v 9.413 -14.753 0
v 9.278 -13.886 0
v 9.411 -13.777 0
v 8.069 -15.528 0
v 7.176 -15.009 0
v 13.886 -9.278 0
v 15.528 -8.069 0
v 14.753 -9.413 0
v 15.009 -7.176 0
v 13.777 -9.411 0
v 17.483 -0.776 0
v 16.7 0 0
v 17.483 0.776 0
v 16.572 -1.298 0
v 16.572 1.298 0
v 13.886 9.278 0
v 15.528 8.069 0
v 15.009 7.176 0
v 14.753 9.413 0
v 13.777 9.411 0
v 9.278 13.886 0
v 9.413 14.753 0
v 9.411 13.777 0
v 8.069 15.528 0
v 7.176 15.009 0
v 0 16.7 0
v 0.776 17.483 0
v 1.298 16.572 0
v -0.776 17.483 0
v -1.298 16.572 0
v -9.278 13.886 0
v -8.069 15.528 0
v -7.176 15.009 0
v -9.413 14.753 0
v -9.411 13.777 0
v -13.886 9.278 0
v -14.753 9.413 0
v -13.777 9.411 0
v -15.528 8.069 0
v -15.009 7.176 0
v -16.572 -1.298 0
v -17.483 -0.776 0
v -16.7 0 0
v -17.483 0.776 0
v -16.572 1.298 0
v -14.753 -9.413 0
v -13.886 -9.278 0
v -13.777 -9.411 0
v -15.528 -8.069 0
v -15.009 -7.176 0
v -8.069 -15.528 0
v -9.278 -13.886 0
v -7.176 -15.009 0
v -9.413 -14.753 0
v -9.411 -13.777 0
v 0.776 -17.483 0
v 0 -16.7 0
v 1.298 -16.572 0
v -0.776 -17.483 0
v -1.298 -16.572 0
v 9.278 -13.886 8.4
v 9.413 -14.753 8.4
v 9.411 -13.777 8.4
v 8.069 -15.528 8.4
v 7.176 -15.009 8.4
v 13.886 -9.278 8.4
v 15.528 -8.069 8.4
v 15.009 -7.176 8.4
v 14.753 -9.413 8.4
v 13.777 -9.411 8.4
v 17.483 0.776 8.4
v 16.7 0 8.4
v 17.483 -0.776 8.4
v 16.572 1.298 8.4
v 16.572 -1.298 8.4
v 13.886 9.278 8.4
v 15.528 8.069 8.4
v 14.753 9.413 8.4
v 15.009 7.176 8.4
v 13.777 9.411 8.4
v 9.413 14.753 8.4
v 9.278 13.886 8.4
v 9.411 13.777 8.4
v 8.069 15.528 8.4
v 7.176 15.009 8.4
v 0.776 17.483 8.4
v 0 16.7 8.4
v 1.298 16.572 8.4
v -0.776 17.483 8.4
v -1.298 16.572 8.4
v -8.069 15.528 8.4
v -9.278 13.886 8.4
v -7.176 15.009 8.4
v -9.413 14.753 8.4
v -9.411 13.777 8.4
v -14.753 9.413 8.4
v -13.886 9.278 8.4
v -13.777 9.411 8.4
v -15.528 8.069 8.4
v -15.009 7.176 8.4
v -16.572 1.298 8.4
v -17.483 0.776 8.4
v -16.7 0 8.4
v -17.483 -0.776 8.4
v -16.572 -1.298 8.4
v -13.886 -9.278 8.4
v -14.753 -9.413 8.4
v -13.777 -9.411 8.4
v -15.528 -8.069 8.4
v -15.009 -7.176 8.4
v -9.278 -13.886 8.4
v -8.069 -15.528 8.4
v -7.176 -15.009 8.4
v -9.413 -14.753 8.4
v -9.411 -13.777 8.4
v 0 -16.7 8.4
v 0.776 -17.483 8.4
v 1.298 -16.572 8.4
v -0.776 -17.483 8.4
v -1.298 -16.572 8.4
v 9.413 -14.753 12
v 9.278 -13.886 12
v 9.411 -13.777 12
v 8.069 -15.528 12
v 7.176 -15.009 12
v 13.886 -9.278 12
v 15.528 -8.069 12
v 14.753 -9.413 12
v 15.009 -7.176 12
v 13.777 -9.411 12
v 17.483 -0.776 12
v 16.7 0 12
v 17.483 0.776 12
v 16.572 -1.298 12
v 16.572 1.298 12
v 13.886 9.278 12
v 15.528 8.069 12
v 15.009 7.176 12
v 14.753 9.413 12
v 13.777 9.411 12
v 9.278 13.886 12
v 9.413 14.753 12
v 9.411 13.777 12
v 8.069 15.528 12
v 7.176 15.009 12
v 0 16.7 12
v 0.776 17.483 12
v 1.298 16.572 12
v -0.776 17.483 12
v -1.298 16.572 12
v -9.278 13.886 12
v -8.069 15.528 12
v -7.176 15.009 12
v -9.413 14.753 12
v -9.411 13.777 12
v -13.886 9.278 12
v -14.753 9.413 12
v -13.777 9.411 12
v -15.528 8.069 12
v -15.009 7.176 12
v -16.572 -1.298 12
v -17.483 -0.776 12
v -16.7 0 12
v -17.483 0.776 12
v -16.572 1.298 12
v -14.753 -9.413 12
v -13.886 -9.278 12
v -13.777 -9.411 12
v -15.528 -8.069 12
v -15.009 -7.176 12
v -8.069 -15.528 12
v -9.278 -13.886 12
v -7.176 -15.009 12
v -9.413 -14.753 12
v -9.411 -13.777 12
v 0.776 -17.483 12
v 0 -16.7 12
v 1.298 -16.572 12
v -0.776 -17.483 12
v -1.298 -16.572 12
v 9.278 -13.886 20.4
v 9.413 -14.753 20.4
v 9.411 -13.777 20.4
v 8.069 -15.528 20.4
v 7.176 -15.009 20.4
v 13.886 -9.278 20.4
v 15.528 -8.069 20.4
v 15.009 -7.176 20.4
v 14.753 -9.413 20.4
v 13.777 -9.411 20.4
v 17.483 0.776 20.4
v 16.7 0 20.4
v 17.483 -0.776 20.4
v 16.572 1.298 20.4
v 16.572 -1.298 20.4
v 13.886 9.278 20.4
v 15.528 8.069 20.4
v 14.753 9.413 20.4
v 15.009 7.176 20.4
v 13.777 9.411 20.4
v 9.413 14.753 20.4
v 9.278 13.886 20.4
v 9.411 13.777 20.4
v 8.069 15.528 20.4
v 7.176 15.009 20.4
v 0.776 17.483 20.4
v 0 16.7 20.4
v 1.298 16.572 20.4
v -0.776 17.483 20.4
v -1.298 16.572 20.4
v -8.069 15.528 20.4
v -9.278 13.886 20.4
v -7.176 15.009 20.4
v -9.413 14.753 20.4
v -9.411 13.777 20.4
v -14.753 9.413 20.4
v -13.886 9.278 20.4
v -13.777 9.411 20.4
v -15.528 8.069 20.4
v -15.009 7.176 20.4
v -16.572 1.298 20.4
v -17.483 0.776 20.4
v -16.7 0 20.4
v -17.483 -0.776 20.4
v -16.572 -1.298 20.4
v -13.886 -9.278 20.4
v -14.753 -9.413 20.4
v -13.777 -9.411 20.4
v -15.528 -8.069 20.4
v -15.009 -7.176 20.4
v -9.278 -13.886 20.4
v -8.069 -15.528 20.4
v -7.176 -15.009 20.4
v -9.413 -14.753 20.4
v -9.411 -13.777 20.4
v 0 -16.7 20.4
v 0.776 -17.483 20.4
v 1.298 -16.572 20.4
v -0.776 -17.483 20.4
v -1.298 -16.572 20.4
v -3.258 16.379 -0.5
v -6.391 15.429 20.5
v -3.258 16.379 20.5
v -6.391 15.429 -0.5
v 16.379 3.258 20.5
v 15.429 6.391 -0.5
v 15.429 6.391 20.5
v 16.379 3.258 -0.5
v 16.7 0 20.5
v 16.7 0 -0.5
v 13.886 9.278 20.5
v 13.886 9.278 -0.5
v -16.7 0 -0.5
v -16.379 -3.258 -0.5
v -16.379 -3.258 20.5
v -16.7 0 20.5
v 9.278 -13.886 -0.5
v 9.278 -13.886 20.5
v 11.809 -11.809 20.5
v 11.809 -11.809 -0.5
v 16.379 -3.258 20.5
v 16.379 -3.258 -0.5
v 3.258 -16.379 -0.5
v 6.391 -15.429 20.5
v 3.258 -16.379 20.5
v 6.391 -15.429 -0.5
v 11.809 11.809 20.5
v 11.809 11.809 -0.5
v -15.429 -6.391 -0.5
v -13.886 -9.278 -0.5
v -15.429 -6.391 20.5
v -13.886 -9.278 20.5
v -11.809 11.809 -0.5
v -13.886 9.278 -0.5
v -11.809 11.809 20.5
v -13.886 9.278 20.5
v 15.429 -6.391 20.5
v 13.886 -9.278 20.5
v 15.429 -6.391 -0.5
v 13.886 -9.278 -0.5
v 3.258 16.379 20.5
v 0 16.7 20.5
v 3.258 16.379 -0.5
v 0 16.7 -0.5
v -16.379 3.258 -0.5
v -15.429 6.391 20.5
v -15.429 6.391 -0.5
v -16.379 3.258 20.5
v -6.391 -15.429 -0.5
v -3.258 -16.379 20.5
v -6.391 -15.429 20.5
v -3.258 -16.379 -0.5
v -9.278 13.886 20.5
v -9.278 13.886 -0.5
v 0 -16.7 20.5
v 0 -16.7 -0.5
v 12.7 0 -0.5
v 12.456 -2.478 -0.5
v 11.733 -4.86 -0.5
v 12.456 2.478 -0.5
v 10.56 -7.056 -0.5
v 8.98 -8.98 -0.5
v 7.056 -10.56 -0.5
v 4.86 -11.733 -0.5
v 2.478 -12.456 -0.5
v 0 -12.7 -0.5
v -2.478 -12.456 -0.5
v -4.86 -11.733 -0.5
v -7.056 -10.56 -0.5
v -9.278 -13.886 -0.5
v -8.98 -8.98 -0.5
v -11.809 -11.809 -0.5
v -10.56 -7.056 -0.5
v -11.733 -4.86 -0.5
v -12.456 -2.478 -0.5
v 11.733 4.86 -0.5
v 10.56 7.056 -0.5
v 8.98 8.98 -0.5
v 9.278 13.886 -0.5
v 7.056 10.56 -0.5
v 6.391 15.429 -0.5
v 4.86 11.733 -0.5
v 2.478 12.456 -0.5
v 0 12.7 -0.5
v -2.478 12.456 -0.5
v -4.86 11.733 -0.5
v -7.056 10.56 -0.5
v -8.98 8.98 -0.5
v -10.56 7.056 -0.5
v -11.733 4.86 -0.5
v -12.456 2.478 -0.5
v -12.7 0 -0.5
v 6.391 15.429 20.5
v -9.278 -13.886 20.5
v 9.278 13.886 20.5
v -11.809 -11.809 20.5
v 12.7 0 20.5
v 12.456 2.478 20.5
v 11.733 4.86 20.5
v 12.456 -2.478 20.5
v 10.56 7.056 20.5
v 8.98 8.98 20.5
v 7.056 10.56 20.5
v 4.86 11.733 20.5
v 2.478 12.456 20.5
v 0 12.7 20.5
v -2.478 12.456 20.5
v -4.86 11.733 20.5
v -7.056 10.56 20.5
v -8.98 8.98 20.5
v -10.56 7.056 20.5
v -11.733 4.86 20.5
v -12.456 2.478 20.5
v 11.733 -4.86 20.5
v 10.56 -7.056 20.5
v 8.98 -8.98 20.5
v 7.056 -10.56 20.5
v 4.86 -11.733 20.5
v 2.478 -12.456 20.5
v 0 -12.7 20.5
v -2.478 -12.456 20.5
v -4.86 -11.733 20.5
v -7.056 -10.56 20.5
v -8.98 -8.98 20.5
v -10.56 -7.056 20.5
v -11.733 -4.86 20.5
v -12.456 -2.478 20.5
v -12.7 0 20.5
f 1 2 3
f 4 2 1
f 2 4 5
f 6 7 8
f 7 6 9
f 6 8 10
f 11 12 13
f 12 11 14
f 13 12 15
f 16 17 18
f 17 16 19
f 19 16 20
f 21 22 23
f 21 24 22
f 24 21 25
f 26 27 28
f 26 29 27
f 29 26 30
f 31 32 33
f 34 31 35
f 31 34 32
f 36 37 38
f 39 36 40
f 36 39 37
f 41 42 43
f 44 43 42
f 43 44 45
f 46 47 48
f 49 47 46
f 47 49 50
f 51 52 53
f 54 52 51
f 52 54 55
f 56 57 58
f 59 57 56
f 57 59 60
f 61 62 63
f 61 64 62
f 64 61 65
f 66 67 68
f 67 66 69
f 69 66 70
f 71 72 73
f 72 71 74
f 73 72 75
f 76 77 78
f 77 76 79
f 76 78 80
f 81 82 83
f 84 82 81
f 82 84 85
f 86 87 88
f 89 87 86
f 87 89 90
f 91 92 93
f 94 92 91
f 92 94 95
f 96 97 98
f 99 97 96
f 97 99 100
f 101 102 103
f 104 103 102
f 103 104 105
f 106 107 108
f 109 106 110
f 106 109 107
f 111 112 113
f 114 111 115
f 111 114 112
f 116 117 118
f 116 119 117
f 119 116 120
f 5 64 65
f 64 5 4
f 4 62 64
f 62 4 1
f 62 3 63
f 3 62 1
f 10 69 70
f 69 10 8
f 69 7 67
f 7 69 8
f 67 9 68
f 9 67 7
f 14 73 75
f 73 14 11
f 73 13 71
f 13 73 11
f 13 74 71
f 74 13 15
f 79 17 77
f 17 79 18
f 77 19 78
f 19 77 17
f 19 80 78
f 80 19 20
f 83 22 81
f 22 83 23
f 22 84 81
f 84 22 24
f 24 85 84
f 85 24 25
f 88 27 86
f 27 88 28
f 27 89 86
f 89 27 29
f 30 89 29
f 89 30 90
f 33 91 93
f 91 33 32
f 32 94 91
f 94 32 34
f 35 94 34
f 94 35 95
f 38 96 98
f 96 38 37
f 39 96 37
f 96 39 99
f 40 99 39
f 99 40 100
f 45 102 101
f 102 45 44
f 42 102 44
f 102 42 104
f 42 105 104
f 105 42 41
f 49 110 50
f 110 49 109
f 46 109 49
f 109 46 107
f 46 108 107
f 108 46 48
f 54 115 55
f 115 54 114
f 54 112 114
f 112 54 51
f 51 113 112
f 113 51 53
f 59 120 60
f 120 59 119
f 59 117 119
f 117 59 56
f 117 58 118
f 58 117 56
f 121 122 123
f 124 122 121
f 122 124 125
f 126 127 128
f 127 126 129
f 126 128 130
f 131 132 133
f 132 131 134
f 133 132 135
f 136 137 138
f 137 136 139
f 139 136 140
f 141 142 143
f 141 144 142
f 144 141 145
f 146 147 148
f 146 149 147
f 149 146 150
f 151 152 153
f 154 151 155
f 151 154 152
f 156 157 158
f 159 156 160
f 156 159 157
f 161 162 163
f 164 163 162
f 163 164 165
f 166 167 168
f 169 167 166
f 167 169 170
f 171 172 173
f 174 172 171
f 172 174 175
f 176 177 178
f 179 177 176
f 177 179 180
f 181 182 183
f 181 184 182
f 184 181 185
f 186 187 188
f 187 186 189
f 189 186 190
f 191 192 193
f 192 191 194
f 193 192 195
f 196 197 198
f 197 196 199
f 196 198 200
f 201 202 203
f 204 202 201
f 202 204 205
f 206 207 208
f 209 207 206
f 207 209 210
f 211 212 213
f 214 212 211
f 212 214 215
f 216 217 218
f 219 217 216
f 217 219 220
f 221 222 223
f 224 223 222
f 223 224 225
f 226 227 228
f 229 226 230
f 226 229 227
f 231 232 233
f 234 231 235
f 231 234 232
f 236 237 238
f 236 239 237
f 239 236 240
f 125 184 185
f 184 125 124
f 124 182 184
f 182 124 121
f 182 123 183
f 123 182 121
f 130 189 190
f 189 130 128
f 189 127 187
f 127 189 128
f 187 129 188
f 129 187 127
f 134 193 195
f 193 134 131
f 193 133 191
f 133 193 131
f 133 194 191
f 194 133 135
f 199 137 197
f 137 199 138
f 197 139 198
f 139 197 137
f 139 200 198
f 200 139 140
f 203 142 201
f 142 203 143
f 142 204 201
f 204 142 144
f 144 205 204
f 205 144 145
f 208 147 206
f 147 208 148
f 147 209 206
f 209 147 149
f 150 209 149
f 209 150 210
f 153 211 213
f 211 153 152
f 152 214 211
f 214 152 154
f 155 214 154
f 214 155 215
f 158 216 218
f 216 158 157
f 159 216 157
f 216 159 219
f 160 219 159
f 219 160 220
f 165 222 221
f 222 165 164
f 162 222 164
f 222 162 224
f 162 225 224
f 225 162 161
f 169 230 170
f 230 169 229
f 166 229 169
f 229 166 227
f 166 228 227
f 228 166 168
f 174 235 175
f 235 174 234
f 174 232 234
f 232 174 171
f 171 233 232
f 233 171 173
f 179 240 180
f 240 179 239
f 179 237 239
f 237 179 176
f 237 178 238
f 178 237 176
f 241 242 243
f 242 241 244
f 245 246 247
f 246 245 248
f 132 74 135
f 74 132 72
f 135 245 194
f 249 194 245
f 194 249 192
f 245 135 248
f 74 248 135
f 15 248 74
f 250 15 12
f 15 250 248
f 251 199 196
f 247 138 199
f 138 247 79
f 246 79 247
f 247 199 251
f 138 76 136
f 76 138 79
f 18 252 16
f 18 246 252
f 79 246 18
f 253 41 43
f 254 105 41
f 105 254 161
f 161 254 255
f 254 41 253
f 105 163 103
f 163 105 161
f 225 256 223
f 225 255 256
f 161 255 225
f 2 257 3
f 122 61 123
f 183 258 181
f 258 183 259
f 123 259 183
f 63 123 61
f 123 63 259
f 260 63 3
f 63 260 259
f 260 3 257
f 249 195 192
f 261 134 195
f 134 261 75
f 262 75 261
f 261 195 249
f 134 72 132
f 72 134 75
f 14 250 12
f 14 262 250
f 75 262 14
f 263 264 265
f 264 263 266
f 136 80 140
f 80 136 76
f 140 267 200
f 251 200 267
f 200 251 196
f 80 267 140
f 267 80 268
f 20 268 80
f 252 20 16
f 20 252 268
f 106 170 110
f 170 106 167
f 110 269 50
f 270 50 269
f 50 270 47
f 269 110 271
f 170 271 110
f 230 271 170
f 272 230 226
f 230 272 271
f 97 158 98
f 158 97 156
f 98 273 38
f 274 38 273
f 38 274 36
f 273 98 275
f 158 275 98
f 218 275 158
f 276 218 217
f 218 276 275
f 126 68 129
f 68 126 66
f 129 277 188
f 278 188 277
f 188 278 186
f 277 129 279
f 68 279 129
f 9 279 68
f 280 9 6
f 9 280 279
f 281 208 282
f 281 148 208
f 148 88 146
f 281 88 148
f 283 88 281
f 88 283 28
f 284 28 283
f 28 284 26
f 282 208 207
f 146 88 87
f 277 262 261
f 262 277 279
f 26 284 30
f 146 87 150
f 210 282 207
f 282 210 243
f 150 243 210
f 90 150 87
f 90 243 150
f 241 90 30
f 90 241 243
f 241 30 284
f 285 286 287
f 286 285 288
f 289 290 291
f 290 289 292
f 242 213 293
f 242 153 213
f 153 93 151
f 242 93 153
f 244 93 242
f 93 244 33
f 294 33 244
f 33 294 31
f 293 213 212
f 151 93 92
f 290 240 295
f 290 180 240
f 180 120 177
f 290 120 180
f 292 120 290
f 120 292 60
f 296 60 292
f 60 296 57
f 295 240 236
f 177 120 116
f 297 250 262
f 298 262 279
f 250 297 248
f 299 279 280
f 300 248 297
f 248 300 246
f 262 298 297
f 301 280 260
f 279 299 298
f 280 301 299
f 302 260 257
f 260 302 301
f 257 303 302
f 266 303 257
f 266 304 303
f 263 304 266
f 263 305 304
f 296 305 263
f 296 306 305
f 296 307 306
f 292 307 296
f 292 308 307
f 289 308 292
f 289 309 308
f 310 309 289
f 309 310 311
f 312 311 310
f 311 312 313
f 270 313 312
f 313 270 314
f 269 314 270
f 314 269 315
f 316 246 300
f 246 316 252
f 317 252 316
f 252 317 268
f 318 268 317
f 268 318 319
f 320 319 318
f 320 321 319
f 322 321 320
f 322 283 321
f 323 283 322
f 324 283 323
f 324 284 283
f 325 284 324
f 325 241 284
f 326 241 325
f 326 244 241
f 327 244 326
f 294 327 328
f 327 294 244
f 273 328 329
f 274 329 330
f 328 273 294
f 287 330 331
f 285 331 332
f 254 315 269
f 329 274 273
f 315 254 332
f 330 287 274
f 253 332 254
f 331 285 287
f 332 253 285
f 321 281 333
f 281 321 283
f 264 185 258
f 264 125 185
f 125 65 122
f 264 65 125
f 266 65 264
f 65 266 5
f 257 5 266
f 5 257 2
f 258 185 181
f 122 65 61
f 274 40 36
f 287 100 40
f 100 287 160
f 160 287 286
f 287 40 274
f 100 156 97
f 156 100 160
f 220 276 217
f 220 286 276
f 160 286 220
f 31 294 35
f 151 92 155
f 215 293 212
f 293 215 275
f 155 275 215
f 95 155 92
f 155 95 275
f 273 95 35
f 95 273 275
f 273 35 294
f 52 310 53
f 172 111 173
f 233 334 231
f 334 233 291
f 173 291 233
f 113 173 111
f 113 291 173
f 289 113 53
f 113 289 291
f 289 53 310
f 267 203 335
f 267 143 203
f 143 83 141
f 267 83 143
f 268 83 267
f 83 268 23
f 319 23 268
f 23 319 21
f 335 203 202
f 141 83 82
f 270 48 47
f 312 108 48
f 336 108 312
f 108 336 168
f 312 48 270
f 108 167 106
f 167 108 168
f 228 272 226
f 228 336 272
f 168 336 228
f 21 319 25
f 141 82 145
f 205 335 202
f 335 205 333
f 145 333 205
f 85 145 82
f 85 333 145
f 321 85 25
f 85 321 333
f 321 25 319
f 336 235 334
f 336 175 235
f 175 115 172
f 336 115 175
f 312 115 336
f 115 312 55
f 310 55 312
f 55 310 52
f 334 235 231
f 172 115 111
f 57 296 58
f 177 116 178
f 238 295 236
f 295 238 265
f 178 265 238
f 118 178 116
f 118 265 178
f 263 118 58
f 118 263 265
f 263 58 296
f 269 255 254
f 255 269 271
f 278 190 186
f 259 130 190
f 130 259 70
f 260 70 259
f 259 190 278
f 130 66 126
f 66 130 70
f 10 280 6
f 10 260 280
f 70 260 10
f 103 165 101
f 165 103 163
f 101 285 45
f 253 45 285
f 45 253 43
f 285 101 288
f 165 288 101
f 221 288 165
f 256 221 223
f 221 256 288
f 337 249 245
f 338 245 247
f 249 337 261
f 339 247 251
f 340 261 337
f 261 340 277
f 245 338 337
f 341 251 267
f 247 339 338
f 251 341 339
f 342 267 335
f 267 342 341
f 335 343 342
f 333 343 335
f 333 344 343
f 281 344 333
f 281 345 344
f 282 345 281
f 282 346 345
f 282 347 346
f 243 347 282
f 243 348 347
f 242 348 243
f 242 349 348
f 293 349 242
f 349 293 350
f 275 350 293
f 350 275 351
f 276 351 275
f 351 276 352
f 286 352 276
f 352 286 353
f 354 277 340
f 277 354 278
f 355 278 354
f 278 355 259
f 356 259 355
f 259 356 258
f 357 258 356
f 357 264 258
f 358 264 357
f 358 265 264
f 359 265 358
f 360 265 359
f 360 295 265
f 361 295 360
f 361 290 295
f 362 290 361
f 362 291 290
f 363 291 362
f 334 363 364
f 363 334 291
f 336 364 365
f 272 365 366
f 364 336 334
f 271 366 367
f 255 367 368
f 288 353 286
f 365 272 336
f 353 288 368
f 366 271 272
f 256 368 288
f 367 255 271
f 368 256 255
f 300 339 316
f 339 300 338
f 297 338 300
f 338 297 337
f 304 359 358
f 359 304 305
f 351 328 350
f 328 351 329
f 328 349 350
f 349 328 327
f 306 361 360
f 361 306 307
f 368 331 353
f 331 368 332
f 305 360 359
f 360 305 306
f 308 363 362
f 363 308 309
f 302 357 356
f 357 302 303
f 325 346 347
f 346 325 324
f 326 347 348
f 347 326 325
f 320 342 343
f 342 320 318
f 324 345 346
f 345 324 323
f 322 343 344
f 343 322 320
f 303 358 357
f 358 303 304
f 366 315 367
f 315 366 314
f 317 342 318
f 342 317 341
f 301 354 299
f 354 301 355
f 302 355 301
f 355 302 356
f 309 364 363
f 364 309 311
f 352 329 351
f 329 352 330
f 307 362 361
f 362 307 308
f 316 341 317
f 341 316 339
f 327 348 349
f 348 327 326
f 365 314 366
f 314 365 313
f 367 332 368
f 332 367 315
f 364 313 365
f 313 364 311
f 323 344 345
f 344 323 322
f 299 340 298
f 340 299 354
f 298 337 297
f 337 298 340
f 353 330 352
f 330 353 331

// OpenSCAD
$fn = 32;

// ----------------------------------------------------------------------
// Two-module gear rim: z12 m2.5 and z12 m2.5, 20 mm wide
// ----------------------------------------------------------------------

// --- parameters (mm) ---
module_a = 2.5;           // first tooth module
teeth_a = 12;             // first band tooth count
module_b = 2.5;           // second tooth module
teeth_b = 12;             // second band tooth count
band_h = 8;               // height of one tooth band
web_t = 4;                // web thickness between the bands
total = 20;               // overall width over both bands
root_r = 11.88;           // root radius of the coarse band
hub_r = 16.7;             // hub radius
bore_d = 25.4;            // hub bore
hole_count = 4;           // lightening holes
hole_r = 9.69;            // lightening hole circle radius
hole_d = 4;               // lightening hole diameter

band_a = [[11.749, -1.723], [15.146, -1.889], [16.318, -1.444], [17.483, -0.776], [17.483, 0.776], [16.318, 1.444], [15.146, 1.889], [11.749, 1.723], [11.037, 4.383], [14.062, 5.937], [14.854, 6.908], [15.528, 8.069], [14.753, 9.413], [13.41, 9.41], [12.172, 9.209], [9.314, 7.367], [7.367, 9.314], [9.209, 12.172], [9.41, 13.41], [9.413, 14.753], [8.069, 15.528], [6.908, 14.854], [5.937, 14.062], [4.383, 11.037], [1.723, 11.749], [1.889, 15.146], [1.444, 16.318], [0.776, 17.483], [-0.776, 17.483], [-1.444, 16.318], [-1.889, 15.146], [-1.723, 11.749], [-4.383, 11.037], [-5.937, 14.062], [-6.908, 14.854], [-8.069, 15.528], [-9.413, 14.753], [-9.41, 13.41], [-9.209, 12.172], [-7.367, 9.314], [-9.314, 7.367], [-12.172, 9.209], [-13.41, 9.41], [-14.753, 9.413], [-15.528, 8.069], [-14.854, 6.908], [-14.062, 5.937], [-11.037, 4.383], [-11.749, 1.723], [-15.146, 1.889], [-16.318, 1.444], [-17.483, 0.776], [-17.483, -0.776], [-16.318, -1.444], [-15.146, -1.889], [-11.749, -1.723], [-11.037, -4.383], [-14.062, -5.937], [-14.854, -6.908], [-15.528, -8.069], [-14.753, -9.413], [-13.41, -9.41], [-12.172, -9.209], [-9.314, -7.367], [-7.367, -9.314], [-9.209, -12.172], [-9.41, -13.41], [-9.413, -14.753], [-8.069, -15.528], [-6.908, -14.854], [-5.937, -14.062], [-4.383, -11.037], [-1.723, -11.749], [-1.889, -15.146], [-1.444, -16.318], [-0.776, -17.483], [0.776, -17.483], [1.444, -16.318], [1.889, -15.146], [1.723, -11.749], [4.383, -11.037], [5.937, -14.062], [6.908, -14.854], [8.069, -15.528], [9.413, -14.753], [9.41, -13.41], [9.209, -12.172], [7.367, -9.314], [9.314, -7.367], [12.172, -9.209], [13.41, -9.41], [14.753, -9.413], [15.528, -8.069], [14.854, -6.908], [14.062, -5.937], [11.037, -4.383]];
band_b = [[11.749, -1.723], [15.146, -1.889], [16.318, -1.444], [17.483, -0.776], [17.483, 0.776], [16.318, 1.444], [15.146, 1.889], [11.749, 1.723], [11.037, 4.383], [14.062, 5.937], [14.854, 6.908], [15.528, 8.069], [14.753, 9.413], [13.41, 9.41], [12.172, 9.209], [9.314, 7.367], [7.367, 9.314], [9.209, 12.172], [9.41, 13.41], [9.413, 14.753], [8.069, 15.528], [6.908, 14.854], [5.937, 14.062], [4.383, 11.037], [1.723, 11.749], [1.889, 15.146], [1.444, 16.318], [0.776, 17.483], [-0.776, 17.483], [-1.444, 16.318], [-1.889, 15.146], [-1.723, 11.749], [-4.383, 11.037], [-5.937, 14.062], [-6.908, 14.854], [-8.069, 15.528], [-9.413, 14.753], [-9.41, 13.41], [-9.209, 12.172], [-7.367, 9.314], [-9.314, 7.367], [-12.172, 9.209], [-13.41, 9.41], [-14.753, 9.413], [-15.528, 8.069], [-14.854, 6.908], [-14.062, 5.937], [-11.037, 4.383], [-11.749, 1.723], [-15.146, 1.889], [-16.318, 1.444], [-17.483, 0.776], [-17.483, -0.776], [-16.318, -1.444], [-15.146, -1.889], [-11.749, -1.723], [-11.037, -4.383], [-14.062, -5.937], [-14.854, -6.908], [-15.528, -8.069], [-14.753, -9.413], [-13.41, -9.41], [-12.172, -9.209], [-9.314, -7.367], [-7.367, -9.314], [-9.209, -12.172], [-9.41, -13.41], [-9.413, -14.753], [-8.069, -15.528], [-6.908, -14.854], [-5.937, -14.062], [-4.383, -11.037], [-1.723, -11.749], [-1.889, -15.146], [-1.444, -16.318], [-0.776, -17.483], [0.776, -17.483], [1.444, -16.318], [1.889, -15.146], [1.723, -11.749], [4.383, -11.037], [5.937, -14.062], [6.908, -14.854], [8.069, -15.528], [9.413, -14.753], [9.41, -13.41], [9.209, -12.172], [7.367, -9.314], [9.314, -7.367], [12.172, -9.209], [13.41, -9.41], [14.753, -9.413], [15.528, -8.069], [14.854, -6.908], [14.062, -5.937], [11.037, -4.383]];

difference() {
  union() {
    /* tooth band A, overlapping the web by 0.4 mm */
    linear_extrude(height = band_h + 0.4) polygon(band_a);
    /* web */
    translate([0, 0, band_h - 0.4]) cylinder(h = web_t + 0.8, d = 2 * root_r);
    /* tooth band B */
    translate([0, 0, band_h + web_t]) linear_extrude(height = band_h + 0.4) polygon(band_b);
    /* hub */
    translate([0, 0, -0.5]) cylinder(h = total + 1.0, d = 2 * hub_r);
  }
  /* bore */
  translate([0, 0, -2.5]) cylinder(h = total + 5, d = bore_d);
  /* lightening holes through the web */
  for (i = [0 : hole_count - 1]) {
    a = i * 360 / hole_count;
    translate([hole_r * cos(a), hole_r * sin(a), -2.5]) cylinder(h = total + 5, d = hole_d);
  }
}
